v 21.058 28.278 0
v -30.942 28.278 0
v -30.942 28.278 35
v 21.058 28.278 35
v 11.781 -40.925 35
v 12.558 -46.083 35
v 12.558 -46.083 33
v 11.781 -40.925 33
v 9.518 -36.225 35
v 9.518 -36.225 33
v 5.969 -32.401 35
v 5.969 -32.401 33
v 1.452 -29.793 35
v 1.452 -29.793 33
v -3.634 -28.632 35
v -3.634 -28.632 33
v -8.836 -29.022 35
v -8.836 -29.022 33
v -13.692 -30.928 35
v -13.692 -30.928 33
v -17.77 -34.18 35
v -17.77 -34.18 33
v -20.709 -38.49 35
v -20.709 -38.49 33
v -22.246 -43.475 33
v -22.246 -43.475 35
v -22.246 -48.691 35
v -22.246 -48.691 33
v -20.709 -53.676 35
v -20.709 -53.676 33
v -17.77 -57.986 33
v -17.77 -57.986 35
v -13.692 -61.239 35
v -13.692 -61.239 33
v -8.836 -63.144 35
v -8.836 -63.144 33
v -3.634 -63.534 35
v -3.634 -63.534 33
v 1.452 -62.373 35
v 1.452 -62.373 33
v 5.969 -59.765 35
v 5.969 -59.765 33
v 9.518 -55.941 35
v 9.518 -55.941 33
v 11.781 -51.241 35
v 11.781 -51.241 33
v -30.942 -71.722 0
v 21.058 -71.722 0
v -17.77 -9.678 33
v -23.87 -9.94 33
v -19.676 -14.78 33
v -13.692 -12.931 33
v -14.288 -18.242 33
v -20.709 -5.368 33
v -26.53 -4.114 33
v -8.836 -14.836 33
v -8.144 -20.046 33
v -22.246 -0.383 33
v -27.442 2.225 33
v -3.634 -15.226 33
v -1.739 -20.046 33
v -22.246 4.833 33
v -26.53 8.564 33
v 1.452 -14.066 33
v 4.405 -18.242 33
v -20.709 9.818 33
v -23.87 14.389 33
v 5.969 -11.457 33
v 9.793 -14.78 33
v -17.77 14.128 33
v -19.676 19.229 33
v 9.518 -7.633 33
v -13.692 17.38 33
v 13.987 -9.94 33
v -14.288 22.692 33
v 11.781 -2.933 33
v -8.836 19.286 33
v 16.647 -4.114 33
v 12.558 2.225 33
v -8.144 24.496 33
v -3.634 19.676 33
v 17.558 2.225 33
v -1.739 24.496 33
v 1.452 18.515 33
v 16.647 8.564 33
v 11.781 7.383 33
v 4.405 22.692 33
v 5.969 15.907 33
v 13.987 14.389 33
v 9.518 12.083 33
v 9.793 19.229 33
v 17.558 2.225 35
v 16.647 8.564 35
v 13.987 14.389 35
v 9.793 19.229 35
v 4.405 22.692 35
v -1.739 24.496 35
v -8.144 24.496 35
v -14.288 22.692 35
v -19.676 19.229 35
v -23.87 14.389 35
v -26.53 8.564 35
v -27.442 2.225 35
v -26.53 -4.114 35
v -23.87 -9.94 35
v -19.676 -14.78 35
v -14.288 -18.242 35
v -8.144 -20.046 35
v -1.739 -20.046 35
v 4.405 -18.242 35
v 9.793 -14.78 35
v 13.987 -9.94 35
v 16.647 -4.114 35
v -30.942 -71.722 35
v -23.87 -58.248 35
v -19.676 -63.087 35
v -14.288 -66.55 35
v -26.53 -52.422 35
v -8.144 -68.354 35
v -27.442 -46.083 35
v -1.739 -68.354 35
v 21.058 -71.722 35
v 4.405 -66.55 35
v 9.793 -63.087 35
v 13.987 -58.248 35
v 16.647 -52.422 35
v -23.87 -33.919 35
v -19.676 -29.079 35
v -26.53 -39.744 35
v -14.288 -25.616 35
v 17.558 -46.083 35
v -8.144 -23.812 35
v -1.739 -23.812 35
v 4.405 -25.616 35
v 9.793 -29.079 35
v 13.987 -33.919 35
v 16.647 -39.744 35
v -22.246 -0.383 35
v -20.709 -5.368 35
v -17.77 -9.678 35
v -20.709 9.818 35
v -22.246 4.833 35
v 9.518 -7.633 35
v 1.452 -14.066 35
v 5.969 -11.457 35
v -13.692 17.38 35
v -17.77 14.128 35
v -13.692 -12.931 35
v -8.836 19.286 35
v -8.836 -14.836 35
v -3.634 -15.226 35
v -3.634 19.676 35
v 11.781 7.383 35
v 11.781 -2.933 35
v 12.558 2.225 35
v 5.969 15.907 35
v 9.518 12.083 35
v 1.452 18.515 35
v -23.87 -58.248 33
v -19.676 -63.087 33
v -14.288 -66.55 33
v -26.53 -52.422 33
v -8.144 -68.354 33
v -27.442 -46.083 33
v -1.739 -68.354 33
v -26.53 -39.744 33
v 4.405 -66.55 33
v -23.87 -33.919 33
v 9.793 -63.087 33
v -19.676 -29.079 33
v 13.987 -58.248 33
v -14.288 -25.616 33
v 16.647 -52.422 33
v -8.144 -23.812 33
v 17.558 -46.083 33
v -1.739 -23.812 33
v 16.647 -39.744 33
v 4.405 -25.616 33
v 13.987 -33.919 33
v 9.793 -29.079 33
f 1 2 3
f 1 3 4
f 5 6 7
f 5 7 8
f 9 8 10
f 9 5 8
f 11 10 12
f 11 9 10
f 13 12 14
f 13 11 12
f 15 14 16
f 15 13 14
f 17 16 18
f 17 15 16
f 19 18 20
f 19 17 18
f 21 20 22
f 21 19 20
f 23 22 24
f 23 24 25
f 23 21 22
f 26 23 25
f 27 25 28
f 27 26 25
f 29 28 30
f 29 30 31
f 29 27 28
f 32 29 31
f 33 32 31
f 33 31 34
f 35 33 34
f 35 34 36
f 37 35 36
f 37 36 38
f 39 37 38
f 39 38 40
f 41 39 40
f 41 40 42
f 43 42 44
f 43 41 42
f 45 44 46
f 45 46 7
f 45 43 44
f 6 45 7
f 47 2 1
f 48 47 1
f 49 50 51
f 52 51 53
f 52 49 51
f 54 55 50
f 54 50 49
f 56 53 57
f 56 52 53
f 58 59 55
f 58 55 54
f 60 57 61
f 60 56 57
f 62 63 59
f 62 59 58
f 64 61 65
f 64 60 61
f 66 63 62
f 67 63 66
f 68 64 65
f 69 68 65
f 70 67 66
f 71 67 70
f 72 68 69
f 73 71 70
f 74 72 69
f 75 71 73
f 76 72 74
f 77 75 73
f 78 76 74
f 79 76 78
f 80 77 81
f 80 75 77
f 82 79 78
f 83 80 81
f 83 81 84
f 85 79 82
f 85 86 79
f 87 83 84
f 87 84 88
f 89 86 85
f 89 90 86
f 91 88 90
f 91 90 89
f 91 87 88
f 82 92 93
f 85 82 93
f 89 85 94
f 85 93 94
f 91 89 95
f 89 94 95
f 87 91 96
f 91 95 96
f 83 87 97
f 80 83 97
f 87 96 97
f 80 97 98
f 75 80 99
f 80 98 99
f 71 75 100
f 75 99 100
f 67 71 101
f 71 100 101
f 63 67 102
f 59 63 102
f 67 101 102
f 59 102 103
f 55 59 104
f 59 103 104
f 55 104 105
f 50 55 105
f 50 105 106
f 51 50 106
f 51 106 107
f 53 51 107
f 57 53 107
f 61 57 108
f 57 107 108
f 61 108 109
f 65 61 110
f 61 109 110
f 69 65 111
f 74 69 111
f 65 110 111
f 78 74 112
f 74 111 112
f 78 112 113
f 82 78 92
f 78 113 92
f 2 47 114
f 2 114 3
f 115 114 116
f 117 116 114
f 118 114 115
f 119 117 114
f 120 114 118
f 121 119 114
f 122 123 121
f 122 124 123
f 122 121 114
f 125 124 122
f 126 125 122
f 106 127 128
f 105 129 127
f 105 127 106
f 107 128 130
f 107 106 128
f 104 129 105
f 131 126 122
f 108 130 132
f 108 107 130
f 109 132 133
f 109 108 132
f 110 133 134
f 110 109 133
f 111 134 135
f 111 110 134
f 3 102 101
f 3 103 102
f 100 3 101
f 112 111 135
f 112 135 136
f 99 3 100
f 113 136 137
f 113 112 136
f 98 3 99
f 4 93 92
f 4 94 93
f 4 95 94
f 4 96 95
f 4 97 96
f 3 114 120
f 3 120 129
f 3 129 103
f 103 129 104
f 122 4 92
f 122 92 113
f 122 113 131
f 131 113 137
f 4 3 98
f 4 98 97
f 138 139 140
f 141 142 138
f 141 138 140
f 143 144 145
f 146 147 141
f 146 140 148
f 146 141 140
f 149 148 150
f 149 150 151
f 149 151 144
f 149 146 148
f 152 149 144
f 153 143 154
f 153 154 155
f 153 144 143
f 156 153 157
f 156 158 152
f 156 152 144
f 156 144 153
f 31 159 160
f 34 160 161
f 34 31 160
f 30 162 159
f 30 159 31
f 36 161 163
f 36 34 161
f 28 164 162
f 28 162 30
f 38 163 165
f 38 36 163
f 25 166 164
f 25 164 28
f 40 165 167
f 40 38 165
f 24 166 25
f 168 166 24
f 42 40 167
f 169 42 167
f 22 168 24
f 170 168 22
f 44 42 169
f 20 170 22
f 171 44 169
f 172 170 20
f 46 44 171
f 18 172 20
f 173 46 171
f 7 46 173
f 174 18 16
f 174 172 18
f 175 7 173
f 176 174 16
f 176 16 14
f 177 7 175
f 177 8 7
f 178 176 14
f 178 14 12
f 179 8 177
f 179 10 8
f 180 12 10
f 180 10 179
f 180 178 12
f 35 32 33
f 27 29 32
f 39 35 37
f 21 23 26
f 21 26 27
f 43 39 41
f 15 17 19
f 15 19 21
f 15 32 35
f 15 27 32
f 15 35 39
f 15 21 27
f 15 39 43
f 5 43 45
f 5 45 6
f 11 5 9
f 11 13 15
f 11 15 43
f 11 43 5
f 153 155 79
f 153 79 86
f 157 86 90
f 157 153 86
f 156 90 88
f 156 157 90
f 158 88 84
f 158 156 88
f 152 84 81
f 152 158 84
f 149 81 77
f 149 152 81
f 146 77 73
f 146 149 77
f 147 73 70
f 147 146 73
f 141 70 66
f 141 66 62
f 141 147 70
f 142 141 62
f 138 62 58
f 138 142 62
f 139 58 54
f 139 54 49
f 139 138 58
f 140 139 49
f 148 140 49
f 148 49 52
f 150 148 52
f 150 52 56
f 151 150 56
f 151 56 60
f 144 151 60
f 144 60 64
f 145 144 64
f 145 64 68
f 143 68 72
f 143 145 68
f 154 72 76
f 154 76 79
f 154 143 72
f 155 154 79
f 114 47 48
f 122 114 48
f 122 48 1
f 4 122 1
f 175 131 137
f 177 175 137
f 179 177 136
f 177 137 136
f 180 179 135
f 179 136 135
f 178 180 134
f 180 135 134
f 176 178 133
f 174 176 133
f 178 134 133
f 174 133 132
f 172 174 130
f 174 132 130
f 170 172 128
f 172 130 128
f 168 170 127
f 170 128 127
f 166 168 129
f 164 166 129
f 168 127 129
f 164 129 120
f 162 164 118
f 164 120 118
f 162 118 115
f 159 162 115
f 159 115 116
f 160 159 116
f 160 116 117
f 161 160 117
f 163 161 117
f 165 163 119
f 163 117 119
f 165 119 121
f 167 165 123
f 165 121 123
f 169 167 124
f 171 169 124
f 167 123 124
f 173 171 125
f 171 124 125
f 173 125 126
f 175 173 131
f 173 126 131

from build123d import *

# Parameters (mm, degrees)
SKETCH_1_W          = 52
SKETCH_1_H          = 100
EXTRUDE_1_DEPTH     = 35
SKETCH_2_R          = 22.5
SKETCH_2_R_2        = 17.5
CUT_EXTRUDE_1_DEPTH = 2


with BuildPart() as part:
    # 草圖1 → 填料-伸長1 (new body)
    with BuildSketch(Plane.XY):
        with Locations((-4.941582483, -21.722113503)):
            Rectangle(SKETCH_1_W, SKETCH_1_H)
    extrude(amount=EXTRUDE_1_DEPTH)

    # 草圖2 → 除料-伸長1 (cut)
    # profile 1 of 2: a face of its own
    with BuildSketch(Plane.XY.offset(35)):
        with Locations((-4.941582483, 2.224790527)):
            Circle(SKETCH_2_R)
        with Locations((-4.941582483, 2.224790527)):
            Circle(SKETCH_2_R_2, mode=Mode.SUBTRACT)
    # profile 2 of 2: a face of its own
    with BuildSketch(Plane.XY.offset(35)):
        with Locations((-4.941582483, -46.083085038)):
            Circle(SKETCH_2_R)
        with Locations((-4.941582483, -46.083085038)):
            Circle(SKETCH_2_R_2, mode=Mode.SUBTRACT)
    extrude(amount=-CUT_EXTRUDE_1_DEPTH, mode=Mode.SUBTRACT)


solid = part.part
